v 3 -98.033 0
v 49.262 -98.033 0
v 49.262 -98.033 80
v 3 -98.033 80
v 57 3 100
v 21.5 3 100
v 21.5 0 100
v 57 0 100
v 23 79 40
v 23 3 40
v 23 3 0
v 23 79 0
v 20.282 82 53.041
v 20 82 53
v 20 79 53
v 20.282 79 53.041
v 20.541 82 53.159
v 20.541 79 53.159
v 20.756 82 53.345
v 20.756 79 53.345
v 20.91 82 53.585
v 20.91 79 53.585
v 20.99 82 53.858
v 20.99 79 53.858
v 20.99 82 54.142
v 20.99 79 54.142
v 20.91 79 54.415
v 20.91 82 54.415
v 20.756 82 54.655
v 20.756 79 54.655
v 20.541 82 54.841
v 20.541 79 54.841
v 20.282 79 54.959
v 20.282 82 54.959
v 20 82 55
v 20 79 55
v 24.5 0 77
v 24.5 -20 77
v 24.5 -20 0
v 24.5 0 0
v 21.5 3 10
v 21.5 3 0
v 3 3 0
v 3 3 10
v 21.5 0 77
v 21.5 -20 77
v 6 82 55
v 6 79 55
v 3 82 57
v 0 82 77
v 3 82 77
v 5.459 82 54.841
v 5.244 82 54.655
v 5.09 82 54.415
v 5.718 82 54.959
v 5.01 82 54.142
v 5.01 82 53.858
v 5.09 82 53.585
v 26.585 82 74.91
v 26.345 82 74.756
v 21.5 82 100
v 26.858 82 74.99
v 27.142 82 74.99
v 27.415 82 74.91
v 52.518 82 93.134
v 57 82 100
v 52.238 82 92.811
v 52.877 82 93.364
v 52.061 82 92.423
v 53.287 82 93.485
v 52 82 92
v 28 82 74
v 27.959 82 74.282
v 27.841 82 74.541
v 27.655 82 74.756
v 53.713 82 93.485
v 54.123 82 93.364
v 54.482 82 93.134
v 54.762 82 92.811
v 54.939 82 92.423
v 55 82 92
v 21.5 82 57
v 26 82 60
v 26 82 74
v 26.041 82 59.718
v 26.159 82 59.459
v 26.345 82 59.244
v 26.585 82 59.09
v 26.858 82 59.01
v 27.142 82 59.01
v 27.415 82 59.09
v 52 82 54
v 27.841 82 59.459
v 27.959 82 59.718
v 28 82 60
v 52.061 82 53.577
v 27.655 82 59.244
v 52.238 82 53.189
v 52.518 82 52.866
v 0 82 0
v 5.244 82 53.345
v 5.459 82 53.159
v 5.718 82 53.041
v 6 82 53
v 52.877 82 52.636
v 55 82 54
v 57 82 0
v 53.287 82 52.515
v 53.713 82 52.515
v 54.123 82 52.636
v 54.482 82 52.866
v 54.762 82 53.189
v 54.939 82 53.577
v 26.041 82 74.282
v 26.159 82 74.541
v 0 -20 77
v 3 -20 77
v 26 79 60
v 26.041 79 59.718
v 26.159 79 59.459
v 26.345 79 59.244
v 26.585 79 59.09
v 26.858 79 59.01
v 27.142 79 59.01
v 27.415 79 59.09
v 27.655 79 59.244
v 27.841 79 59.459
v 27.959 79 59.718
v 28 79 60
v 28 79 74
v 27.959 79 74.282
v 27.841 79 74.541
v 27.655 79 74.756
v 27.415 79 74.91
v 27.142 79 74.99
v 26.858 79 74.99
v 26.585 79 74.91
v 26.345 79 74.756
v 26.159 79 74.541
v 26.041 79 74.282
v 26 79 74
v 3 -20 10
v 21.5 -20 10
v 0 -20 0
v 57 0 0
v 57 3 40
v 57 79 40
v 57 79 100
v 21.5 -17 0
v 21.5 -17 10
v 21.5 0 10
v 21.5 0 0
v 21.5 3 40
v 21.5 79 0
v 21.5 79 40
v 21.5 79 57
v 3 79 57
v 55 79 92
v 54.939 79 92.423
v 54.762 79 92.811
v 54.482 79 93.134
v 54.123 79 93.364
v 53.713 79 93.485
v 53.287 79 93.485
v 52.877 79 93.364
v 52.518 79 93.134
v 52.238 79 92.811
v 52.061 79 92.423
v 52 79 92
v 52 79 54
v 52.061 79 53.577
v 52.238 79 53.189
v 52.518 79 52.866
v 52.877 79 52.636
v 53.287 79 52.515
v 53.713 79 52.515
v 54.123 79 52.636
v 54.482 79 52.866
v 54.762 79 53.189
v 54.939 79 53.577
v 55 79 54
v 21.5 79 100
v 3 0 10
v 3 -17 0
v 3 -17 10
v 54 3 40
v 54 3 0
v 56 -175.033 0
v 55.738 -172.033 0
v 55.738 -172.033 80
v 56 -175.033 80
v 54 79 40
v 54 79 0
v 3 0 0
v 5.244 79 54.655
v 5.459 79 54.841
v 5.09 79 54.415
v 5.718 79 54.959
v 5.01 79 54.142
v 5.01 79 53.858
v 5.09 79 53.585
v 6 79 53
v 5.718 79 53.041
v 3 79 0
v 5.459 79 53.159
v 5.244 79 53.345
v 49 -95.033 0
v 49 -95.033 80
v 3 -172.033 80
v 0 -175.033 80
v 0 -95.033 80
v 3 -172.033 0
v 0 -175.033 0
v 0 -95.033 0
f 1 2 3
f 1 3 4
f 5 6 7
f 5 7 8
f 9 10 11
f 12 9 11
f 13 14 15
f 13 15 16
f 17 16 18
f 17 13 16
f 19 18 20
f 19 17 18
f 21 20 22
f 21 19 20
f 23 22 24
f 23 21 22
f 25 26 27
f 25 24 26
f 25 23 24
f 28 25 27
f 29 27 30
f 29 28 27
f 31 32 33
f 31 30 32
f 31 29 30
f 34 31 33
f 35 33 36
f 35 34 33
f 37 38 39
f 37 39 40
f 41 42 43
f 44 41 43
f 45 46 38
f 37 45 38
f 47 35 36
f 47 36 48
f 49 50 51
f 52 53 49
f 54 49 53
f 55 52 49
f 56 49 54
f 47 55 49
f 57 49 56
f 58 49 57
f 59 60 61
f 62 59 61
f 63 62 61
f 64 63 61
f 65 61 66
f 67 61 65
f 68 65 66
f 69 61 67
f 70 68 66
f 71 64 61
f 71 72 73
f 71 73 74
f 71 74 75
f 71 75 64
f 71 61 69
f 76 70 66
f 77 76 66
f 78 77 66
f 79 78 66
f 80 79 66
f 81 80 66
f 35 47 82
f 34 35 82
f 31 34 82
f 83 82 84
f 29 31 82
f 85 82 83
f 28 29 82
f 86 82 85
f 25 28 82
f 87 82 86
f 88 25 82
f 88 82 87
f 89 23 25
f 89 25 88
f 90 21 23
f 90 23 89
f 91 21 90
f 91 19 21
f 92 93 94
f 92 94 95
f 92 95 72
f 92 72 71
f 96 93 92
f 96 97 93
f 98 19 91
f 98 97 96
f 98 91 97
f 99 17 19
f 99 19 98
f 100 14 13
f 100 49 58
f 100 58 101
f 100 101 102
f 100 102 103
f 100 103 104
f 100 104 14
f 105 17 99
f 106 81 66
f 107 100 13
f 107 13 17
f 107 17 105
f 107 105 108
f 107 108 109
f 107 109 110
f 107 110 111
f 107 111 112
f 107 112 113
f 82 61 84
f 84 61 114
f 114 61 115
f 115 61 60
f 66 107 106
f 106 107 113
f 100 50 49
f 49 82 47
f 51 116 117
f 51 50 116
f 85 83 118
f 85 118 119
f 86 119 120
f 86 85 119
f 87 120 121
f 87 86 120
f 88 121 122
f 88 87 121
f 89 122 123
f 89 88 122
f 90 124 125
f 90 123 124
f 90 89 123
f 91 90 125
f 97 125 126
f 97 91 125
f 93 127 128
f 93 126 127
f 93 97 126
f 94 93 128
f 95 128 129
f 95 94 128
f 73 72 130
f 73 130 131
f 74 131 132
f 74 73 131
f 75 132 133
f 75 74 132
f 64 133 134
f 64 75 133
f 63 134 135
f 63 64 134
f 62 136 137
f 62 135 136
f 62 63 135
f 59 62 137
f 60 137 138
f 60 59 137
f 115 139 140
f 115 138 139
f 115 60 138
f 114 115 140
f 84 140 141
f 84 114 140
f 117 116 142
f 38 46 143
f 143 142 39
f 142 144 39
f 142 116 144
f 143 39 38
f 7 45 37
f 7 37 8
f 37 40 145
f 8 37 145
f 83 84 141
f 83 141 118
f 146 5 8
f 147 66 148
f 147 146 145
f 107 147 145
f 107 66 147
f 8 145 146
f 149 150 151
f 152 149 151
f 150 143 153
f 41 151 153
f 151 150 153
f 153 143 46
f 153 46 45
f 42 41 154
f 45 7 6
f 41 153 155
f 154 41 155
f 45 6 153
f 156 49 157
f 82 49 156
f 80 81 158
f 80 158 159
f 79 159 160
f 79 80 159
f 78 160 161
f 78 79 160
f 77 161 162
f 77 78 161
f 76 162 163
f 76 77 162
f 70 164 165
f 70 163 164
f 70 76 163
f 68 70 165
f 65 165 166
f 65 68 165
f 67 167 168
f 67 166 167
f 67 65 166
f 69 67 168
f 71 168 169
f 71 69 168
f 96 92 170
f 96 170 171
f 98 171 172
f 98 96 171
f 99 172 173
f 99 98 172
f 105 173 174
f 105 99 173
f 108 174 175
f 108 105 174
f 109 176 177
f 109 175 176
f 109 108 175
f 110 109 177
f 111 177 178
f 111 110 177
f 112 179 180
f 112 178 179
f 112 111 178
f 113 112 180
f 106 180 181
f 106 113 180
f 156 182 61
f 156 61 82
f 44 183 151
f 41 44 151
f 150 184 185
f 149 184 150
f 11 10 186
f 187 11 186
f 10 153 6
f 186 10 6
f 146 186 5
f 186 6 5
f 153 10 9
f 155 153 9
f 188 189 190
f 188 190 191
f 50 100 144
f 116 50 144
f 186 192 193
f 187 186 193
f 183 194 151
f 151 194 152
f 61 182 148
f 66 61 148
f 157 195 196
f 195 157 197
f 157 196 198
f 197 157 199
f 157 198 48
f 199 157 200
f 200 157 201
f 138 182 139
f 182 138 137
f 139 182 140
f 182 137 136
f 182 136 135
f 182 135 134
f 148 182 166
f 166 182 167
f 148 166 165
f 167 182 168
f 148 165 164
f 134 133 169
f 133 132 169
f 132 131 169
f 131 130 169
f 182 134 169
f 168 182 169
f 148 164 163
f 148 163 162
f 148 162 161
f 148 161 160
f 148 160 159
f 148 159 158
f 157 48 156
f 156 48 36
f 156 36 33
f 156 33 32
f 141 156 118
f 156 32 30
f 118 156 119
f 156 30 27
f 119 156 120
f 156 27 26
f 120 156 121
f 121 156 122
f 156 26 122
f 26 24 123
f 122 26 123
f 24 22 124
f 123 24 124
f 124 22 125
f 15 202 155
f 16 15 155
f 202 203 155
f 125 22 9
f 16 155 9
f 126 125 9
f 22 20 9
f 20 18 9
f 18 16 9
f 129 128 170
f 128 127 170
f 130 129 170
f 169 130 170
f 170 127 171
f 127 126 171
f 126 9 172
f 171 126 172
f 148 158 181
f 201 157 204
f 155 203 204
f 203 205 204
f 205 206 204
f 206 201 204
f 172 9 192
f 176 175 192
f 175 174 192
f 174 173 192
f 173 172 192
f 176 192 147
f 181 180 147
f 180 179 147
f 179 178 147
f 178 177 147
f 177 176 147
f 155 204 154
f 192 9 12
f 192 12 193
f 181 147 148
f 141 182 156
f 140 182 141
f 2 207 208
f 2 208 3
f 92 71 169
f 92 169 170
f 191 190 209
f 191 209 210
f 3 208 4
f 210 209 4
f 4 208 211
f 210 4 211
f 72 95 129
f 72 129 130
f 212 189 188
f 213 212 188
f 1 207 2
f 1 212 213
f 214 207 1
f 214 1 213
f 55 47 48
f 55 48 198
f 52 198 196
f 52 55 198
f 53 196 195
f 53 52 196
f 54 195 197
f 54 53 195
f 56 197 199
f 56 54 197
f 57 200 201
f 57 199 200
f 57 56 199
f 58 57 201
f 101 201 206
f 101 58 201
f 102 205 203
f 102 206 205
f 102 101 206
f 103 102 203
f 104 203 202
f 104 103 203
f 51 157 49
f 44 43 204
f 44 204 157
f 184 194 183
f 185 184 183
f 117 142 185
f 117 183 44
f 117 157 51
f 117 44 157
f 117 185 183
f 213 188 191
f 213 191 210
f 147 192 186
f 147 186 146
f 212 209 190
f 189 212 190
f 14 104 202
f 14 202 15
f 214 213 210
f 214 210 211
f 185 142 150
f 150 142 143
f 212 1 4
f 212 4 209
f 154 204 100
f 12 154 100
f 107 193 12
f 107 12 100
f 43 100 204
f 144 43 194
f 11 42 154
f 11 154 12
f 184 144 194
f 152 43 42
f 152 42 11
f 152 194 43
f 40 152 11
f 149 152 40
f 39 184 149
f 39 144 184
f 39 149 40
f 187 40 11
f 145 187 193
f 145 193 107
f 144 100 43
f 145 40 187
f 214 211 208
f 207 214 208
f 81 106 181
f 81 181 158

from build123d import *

# Parameters (mm, degrees)
EXTRUDE_1_DEPTH      = 100
EXTRUDE_2_DEPTH      = 80
SKETCH_4_W           = 23
SKETCH_4_H           = 23
CUT_EXTRUDE_5_DEPTH  = 80
EXTRUDE_4_DEPTH      = 77
SKETCH_7_W           = 18.5
SKETCH_7_H           = 98.970851358
CUT_EXTRUDE_8_DEPTH  = 50
SKETCH_5_W           = 4
SKETCH_5_H           = 100
CUT_EXTRUDE_9_DEPTH  = 105
SKETCH_8_W           = 20
SKETCH_8_H           = 20
CUT_EXTRUDE_11_DEPTH = 14
SKETCH_12_W          = 3
SKETCH_12_H          = 40
EXTRUDE_8_DEPTH      = 79
SKETCH_14_W          = 1.5
SKETCH_14_H          = 77
EXTRUDE_11_DEPTH     = 79
SKETCH_15_W          = 37
SKETCH_15_H          = 76
CUT_EXTRUDE_12_DEPTH = 46
SKETCH_16_W          = 21.5
SKETCH_16_H          = 23
CUT_EXTRUDE_13_DEPTH = 10
SKETCH_1_7_W         = 24.5
SKETCH_1_7_H         = 20
EXTRUDE_12_DEPTH     = 77
SKETCH_7_3_W         = 18.5
SKETCH_7_3_H         = 98.970851358
CUT_EXTRUDE_14_DEPTH = 20
SKETCH_1_8_W         = 18.5
SKETCH_1_8_H         = 17
CUT_EXTRUDE_15_DEPTH = 17
EXTRUDE_START        = -3
SKETCH_19_W          = 1.5
SKETCH_19_H          = 23
EXTRUDE_13_DEPTH     = 3
SKETCH_20_W          = 1.5
SKETCH_20_H          = 1
EXTRUDE_14_DEPTH     = 100


with BuildPart() as part:
    # 스케치1 → 보스-돌출1 (new body)
    with BuildSketch(Plane.XY):
        Polygon((0, 0), (61, 0), (60.853658537, 3), (3, 3), (3, 79), (57.146341463, 79), (57, 82), (0, 82), align=None)
    extrude(amount=EXTRUDE_1_DEPTH)

    # 스케치4 → 컷-돌출5 (cut)
    with BuildSketch(Plane(origin=(0, 82, 0), x_dir=(1, 0, 0), z_dir=(0, 1, 0))):
        with Locations((11.5, -88.5)):
            Rectangle(SKETCH_4_W, SKETCH_4_H)
    extrude(amount=-CUT_EXTRUDE_5_DEPTH, mode=Mode.SUBTRACT)

    # 스케치1<5> → 보스-돌출4 (add)
    with BuildSketch(Plane.XY):
        Polygon((3, 0), (0, 0), (0, -20), (24.5, -20), (24.5, 0), (21.5, 0), (21.5, -17), (3, -17), align=None)
    extrude(amount=EXTRUDE_4_DEPTH)

    # 스케치7 → 컷-돌출8 (cut)
    with BuildSketch(Plane.XZ.offset(20)):
        with Locations((12.25, 59.485425679)):
            Rectangle(SKETCH_7_W, SKETCH_7_H)
    extrude(amount=-CUT_EXTRUDE_8_DEPTH, mode=Mode.SUBTRACT)

    # 스케치5 → 컷-돌출9 (cut)
    with BuildSketch(Plane(origin=(0, 82, 0), x_dir=(1, 0, 0), z_dir=(0, 1, 0))):
        with Locations((59, -50)):
            Rectangle(SKETCH_5_W, SKETCH_5_H)
    extrude(amount=-CUT_EXTRUDE_9_DEPTH, mode=Mode.SUBTRACT)

    # 스케치8 → 컷-돌출11 (cut)
    with BuildSketch(Plane(origin=(0, 82, 0), x_dir=(1, 0, 0), z_dir=(0, 1, 0))):
        with BuildLine():
            Line((6, -53), (20, -53))
            ThreePointArc((20, -53), (21, -54), (20, -55))
            Line((20, -55), (6, -55))
            ThreePointArc((6, -55), (5, -54), (6, -53))
        make_face()
        with BuildLine():
            Line((26, -74), (26, -60))
            ThreePointArc((26, -60), (27, -59), (28, -60))
            Line((28, -60), (28, -74))
            ThreePointArc((28, -74), (27, -75), (26, -74))
        make_face()
        with Locations((13, -67)):
            Rectangle(SKETCH_8_W, SKETCH_8_H)
        with BuildLine():
            Line((52, -92), (52, -54))
            ThreePointArc((52, -54), (53.5, -52.5), (55, -54))
            Line((55, -54), (55, -92))
            ThreePointArc((55, -92), (53.5, -93.5), (52, -92))
        make_face()
    extrude(amount=-CUT_EXTRUDE_11_DEPTH, mode=Mode.SUBTRACT)

    # 스케치12 → 보스-돌출8 (add)
    with BuildSketch(Plane(origin=(0, 82, 0), x_dir=(1, 0, 0), z_dir=(0, 1, 0))):
        with Locations((55.5, -20)):
            Rectangle(SKETCH_12_W, SKETCH_12_H)
    extrude(amount=-EXTRUDE_8_DEPTH)

    # 스케치14 → 보스-돌출11 (add)
    with BuildSketch(Plane(origin=(0, 3, 0), x_dir=(1, 0, 0), z_dir=(0, 1, 0))):
        with Locations((22.25, -38.5)):
            Rectangle(SKETCH_14_W, SKETCH_14_H)
    extrude(amount=EXTRUDE_11_DEPTH)

    # 스케치15 → 컷-돌출12 (cut)
    with BuildSketch(Plane(origin=(57, 0, 0), x_dir=(0, 0, -1), z_dir=(1, 0, 0))):
        with Locations((-58.5, 41)):
            Rectangle(SKETCH_15_W, SKETCH_15_H)
    extrude(amount=-CUT_EXTRUDE_12_DEPTH, mode=Mode.SUBTRACT)

    # 스케치16 → 컷-돌출13 (cut)
    with BuildSketch(Plane(origin=(0, 3, 0), x_dir=(1, 0, 0), z_dir=(0, 1, 0))):
        with Locations((10.75, -88.5)):
            Rectangle(SKETCH_16_W, SKETCH_16_H)
    extrude(amount=-CUT_EXTRUDE_13_DEPTH, mode=Mode.SUBTRACT)

    # 스케치1<7> → 보스-돌출12 (add)
    with BuildSketch(Plane.XY):
        with Locations((12.25, -10)):
            Rectangle(SKETCH_1_7_W, SKETCH_1_7_H)
    extrude(amount=EXTRUDE_12_DEPTH)

    # 스케치7<3> → 컷-돌출14 (cut)
    with BuildSketch(Plane.XZ.offset(20)):
        with Locations((12.25, 59.485425679)):
            Rectangle(SKETCH_7_3_W, SKETCH_7_3_H)
    extrude(amount=-CUT_EXTRUDE_14_DEPTH, mode=Mode.SUBTRACT)

    # 스케치1<8> → 컷-돌출15 (cut)
    with BuildSketch(Plane.XY):
        with Locations((12.25, -8.5)):
            Rectangle(SKETCH_1_8_W, SKETCH_1_8_H)
    extrude(amount=CUT_EXTRUDE_15_DEPTH, mode=Mode.SUBTRACT)

    # 스케치19 → 보스-돌출13 (add)
    with BuildSketch(Plane(origin=(0, 82, 0), x_dir=(1, 0, 0), z_dir=(0, 1, 0)).offset(EXTRUDE_START)):
        with Locations((22.25, -88.5)):
            Rectangle(SKETCH_19_W, SKETCH_19_H)
    extrude(amount=EXTRUDE_13_DEPTH)

    # 스케치20 → 보스-돌출14 (add)
    with BuildSketch(Plane.XY.offset(100)):
        with Locations((22.25, 2.5)):
            Rectangle(SKETCH_20_W, SKETCH_20_H)
    extrude(amount=-EXTRUDE_14_DEPTH)


with BuildPart() as body_2:
    # 스케치1<3> → 보스-돌출2 (new body)
    with BuildSketch(Plane.XY):
        Polygon((0, -95.03327627), (49, -95.03327627), (49.2625, -98.03327627), (3, -98.03327627), (3, -172.03327627), (55.7375, -172.03327627), (56, -175.03327627), (0, -175.03327627), align=None)
    extrude(amount=EXTRUDE_2_DEPTH)


solid = Compound([part.part, body_2.part])
